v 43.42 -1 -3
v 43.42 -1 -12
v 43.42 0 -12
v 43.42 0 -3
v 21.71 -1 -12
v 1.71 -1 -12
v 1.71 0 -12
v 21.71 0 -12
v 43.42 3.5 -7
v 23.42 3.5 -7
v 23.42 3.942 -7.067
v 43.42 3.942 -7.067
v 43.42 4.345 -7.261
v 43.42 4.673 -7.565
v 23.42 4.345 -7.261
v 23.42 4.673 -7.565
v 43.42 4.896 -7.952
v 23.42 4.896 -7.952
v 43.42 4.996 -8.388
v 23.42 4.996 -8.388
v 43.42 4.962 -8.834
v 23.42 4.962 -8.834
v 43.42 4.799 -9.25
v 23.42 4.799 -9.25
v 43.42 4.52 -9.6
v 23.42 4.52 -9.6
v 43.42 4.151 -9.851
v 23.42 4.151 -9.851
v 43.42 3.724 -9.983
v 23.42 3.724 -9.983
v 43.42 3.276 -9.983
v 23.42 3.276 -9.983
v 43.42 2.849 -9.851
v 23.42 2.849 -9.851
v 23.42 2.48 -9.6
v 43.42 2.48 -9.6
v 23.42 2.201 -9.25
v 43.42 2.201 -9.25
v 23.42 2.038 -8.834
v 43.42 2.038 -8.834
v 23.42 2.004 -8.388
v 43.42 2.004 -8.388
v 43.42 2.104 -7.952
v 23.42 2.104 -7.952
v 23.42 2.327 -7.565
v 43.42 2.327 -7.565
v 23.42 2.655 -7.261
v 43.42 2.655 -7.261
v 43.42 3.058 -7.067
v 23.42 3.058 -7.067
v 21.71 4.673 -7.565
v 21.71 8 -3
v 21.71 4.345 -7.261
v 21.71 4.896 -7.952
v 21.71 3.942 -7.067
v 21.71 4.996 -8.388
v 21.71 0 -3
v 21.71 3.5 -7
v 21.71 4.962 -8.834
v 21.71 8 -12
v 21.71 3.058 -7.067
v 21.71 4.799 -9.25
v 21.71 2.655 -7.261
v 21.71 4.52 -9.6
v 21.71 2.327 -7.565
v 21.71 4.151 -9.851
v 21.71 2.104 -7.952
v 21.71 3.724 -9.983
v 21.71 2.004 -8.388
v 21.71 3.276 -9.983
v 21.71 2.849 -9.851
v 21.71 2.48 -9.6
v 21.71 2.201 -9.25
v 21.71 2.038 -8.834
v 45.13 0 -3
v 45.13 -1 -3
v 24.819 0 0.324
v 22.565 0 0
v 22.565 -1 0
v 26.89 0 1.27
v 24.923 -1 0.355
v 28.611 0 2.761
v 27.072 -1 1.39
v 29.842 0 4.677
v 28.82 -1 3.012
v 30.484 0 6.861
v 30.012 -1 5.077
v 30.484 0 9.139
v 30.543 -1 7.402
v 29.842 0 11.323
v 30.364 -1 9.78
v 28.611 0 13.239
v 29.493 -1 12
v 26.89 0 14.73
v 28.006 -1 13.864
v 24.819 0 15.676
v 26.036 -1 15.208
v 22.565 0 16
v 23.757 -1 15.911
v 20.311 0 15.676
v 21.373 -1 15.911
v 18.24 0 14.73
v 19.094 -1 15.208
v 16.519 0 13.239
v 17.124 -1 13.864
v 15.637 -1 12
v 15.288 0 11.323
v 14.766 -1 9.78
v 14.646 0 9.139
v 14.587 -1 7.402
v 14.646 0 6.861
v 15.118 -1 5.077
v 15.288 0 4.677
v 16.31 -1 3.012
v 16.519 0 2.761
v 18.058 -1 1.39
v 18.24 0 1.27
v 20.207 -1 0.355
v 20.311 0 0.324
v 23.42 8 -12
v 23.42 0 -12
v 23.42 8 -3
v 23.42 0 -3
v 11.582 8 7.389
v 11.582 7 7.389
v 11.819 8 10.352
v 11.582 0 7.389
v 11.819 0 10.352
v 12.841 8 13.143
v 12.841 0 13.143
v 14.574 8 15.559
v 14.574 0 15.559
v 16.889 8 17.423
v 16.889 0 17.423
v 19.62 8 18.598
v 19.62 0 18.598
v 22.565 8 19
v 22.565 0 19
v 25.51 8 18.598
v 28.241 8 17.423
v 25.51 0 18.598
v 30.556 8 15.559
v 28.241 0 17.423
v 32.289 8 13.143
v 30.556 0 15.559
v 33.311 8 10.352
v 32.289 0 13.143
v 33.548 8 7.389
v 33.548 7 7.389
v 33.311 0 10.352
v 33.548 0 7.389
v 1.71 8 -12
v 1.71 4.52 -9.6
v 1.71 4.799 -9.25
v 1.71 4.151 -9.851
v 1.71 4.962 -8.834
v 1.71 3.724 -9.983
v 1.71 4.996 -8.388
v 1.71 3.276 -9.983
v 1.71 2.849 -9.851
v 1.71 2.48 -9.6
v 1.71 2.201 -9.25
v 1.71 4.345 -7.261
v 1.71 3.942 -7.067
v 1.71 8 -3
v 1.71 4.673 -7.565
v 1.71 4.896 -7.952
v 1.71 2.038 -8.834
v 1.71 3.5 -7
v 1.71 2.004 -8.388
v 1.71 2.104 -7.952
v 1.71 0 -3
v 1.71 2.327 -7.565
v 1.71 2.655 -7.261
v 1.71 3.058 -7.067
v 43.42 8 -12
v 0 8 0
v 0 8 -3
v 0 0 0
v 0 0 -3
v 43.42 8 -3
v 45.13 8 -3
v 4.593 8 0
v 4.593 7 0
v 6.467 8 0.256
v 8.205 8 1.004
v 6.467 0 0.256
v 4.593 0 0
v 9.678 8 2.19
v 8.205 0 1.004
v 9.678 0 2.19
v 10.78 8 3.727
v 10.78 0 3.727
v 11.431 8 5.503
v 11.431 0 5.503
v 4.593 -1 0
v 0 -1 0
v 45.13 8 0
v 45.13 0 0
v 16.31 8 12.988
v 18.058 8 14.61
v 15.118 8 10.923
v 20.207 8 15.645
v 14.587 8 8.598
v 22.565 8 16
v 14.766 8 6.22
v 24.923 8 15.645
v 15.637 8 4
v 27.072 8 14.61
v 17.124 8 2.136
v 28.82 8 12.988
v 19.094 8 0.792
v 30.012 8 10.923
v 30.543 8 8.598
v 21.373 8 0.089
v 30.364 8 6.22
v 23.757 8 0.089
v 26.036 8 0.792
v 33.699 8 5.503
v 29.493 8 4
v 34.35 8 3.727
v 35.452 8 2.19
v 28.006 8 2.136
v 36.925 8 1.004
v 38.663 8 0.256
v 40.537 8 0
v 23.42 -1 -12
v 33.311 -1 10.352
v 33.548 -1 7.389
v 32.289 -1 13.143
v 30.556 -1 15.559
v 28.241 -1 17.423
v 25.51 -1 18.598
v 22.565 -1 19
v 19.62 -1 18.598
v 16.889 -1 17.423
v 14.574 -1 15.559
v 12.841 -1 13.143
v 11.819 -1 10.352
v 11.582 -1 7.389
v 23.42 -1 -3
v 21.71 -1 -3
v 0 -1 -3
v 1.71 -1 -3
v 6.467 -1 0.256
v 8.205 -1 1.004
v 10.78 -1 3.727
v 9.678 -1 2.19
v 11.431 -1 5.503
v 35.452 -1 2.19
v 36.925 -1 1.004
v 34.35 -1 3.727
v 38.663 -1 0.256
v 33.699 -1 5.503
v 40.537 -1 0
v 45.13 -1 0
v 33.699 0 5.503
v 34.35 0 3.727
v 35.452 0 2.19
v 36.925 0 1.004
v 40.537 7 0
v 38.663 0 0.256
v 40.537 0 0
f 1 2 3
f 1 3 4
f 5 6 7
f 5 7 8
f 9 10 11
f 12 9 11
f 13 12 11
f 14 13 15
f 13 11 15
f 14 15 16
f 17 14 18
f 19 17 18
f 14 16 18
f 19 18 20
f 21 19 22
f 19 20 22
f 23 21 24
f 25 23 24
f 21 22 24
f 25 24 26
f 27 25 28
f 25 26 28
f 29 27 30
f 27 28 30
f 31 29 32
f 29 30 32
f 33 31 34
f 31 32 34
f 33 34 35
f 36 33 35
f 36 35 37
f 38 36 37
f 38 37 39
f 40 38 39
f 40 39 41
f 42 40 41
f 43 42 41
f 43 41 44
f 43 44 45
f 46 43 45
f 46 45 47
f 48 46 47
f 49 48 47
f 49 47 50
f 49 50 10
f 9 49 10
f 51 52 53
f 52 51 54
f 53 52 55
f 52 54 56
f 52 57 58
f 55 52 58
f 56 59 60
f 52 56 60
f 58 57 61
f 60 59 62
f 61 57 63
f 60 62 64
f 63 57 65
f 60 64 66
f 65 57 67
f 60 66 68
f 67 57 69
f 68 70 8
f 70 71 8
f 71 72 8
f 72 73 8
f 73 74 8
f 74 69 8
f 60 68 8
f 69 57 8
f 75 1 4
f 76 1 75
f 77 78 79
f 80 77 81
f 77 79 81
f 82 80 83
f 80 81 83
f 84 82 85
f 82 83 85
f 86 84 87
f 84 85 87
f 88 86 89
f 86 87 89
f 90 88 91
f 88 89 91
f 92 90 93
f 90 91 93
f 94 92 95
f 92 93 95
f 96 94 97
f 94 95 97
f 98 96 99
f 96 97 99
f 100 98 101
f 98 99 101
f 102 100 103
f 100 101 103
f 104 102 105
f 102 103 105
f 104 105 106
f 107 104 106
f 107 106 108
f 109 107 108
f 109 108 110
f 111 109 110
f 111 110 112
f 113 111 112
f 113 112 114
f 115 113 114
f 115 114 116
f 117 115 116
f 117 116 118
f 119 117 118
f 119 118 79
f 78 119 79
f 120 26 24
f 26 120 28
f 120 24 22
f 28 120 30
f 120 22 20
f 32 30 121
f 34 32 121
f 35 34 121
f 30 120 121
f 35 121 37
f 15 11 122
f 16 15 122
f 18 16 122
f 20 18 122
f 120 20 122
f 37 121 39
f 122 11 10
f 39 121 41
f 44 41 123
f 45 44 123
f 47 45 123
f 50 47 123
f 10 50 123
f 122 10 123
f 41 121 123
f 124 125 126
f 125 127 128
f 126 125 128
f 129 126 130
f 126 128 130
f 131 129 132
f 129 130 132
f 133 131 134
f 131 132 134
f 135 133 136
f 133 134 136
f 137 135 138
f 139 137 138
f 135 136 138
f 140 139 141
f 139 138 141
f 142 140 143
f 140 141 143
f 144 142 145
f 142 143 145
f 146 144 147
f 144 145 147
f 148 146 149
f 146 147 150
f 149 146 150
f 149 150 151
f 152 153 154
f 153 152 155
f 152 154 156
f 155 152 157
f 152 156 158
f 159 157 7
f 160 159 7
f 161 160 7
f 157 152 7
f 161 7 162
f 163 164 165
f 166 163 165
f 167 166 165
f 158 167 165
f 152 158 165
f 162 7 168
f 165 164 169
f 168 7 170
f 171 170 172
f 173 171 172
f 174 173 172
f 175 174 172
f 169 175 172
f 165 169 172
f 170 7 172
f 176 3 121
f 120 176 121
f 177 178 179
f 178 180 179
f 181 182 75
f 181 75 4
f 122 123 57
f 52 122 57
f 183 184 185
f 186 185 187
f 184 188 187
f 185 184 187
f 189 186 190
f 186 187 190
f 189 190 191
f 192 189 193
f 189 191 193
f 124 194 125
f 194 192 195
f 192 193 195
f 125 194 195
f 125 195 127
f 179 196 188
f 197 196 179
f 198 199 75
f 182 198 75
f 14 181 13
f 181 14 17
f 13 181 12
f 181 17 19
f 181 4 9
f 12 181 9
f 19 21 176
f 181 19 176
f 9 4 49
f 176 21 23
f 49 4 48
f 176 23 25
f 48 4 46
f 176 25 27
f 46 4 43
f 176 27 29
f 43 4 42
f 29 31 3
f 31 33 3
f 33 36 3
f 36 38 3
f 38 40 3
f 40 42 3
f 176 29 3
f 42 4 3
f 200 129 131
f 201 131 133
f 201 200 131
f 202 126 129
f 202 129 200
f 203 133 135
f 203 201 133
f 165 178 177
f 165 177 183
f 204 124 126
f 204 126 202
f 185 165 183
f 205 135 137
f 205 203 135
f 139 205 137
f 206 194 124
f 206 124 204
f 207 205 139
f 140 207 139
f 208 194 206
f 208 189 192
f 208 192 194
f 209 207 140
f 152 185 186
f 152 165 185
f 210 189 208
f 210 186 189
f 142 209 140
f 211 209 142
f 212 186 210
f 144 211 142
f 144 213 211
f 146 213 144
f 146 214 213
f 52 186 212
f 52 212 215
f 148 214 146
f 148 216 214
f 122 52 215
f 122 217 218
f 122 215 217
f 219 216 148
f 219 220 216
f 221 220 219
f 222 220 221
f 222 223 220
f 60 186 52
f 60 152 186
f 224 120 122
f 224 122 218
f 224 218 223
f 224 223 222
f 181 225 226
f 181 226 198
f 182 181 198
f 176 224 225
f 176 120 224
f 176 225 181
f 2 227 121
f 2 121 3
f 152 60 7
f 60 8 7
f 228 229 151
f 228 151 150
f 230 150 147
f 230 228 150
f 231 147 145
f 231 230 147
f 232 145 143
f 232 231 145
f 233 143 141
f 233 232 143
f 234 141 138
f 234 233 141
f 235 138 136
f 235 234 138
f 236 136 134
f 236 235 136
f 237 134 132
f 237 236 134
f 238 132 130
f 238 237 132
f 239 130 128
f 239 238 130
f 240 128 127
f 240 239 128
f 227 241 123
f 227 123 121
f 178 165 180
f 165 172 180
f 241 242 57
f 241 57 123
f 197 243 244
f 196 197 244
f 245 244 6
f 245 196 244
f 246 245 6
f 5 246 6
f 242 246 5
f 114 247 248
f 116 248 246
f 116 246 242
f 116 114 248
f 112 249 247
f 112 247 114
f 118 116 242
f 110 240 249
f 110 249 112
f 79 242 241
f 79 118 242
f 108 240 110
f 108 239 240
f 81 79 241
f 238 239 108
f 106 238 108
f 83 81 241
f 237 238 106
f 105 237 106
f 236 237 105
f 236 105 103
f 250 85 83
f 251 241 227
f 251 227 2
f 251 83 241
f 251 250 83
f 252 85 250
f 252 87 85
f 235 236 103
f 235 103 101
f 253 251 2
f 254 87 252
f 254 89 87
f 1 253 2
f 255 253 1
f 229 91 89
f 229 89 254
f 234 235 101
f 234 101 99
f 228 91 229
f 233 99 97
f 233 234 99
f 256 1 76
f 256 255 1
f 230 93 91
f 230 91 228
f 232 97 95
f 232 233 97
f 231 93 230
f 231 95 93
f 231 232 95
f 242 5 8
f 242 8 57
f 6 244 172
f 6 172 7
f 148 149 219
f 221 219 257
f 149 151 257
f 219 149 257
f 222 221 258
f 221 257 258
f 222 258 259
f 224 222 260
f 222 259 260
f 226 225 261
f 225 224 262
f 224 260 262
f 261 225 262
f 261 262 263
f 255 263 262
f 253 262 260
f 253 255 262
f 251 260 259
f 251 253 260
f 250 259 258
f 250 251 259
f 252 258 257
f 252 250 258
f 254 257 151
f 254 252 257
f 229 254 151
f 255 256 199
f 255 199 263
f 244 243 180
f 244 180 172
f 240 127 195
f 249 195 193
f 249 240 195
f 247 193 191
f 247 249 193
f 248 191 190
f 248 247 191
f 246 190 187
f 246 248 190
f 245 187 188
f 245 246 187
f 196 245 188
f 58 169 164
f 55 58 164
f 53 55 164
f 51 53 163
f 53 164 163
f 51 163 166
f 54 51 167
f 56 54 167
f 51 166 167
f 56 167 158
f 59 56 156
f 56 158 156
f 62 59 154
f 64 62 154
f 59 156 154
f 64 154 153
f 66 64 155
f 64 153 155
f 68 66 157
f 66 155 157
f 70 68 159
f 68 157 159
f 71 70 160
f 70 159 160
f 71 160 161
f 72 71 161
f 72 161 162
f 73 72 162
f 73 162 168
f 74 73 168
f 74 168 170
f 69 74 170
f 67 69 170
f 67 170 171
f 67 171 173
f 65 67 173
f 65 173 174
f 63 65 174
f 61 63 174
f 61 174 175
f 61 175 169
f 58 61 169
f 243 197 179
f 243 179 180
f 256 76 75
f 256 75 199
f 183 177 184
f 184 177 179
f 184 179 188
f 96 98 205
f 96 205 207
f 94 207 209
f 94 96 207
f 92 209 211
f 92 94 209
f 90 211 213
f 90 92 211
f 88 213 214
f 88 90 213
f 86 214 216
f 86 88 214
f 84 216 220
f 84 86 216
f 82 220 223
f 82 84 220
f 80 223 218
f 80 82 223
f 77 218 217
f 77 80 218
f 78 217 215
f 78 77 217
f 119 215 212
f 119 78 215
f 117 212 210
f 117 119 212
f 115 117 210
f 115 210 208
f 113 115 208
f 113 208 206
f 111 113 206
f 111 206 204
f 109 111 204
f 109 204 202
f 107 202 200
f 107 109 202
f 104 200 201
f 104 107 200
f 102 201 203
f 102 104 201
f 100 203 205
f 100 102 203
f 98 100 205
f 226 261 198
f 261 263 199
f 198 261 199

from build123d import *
from build123d.topology import SkipClean

# Parameters (mm, degrees)
SKETCH1_R           = 11
SKETCH1_R_2         = 8
SKETCH1_W           = 45.13
SKETCH1_H           = 7
BOSS_EXTRUDE1_DEPTH = 10
FILLET1_R           = 7
SKETCH2_W           = 1.71
SKETCH2_H           = 4
CUT_EXTRUDE1_DEPTH  = 10
SKETCH3_W           = 20
SKETCH3_H           = 10
BOSS_EXTRUDE2_DEPTH = 3
CUT_EXTRUDE2_START  = -3
CUT_EXTRUDE2_DEPTH  = 3
SKETCH6_W           = 20
SKETCH6_H           = 7
BOSS_EXTRUDE3_DEPTH = 2
SKETCH7_R           = 1.5
CUT_EXTRUDE5_DEPTH  = 44
SKETCH8_R           = 8
BOSS_EXTRUDE4_DEPTH = 1
BOSS_EXTRUDE5_START = 1
SKETCH9_R           = 8
BOSS_EXTRUDE5_DEPTH = 1


with BuildPart() as part:
    # Sketch1 → Boss-Extrude1 (new body)
    # profile 1 of 2: a face of its own
    with BuildSketch(Plane(origin=(0, 0, 0), x_dir=(1, 0, 0), z_dir=(0, 1, 0))):
        with Locations((22.565, -8)):
            Circle(SKETCH1_R)
        with Locations(Location((22.565, -8, 0), (0, 0, 270))):
            Circle(SKETCH1_R_2, mode=Mode.SUBTRACT)
    # profile 2 of 2: a face of its own
    with BuildSketch(Plane(origin=(0, 0, 0), x_dir=(1, 0, 0), z_dir=(0, 1, 0))):
        with Locations((22.565, 3.5)):
            Rectangle(SKETCH1_W, SKETCH1_H)
    extrude(amount=BOSS_EXTRUDE1_DEPTH)

    # Fillet1
    fillet1_edges = [part.edges().sort_by_distance(p)[0] for p in [
        (30.114834435, 5, 0),
        (15.015165565, 5, 0),
    ]]
    fillet(fillet1_edges, radius=FILLET1_R)

    # Sketch2 → Cut-Extrude1 (cut)
    with BuildSketch(Plane(origin=(0, 10, 0), x_dir=(1, 0, 0), z_dir=(0, 1, 0))):
        with Locations((0.855, 5)):
            Rectangle(SKETCH2_W, SKETCH2_H)
        with Locations((22.565, 5)):
            Rectangle(SKETCH2_W, SKETCH2_H)
        with Locations((44.275, 5)):
            Rectangle(SKETCH2_W, SKETCH2_H)
    extrude(amount=-CUT_EXTRUDE1_DEPTH, mode=Mode.SUBTRACT)

    # Sketch3 → Boss-Extrude2 (add)
    with BuildSketch(Plane(origin=(0, 0, -7), x_dir=(-1, 0, 0), z_dir=(0, 0, -1))):
        with Locations((-33.42, 5)):
            Rectangle(SKETCH3_W, SKETCH3_H)
        with Locations((-11.71, 5)):
            Rectangle(SKETCH3_W, SKETCH3_H)
    extrude(amount=BOSS_EXTRUDE2_DEPTH)

    # Sketch4 → Cut-Extrude2 (cut)
    with BuildSketch(Plane(origin=(0, 10, 0), x_dir=(1, 0, 0), z_dir=(0, 1, 0)).offset(CUT_EXTRUDE2_START)):
        with BuildLine():
            Line((21.71, 3), (21.71, 10))
            Line((21.71, 10), (1.71, 10))
            Line((1.71, 10), (1.71, 3))
            Line((1.71, 3), (0, 3))
            Line((0, 3), (0, 0))
            Line((0, 0), (4.592799244, 0))
            ThreePointArc((4.592799244, 0), (9.678181345, -2.189710103), (11.581988427, -7.388888889))
            ThreePointArc((11.581988427, -7.388888889), (22.565, -19), (33.548011573, -7.388888889))
            ThreePointArc((33.548011573, -7.388888889), (35.451818655, -2.189710103), (40.537200756, 0))
            Line((40.537200756, 0), (45.13, 0))
            Line((45.13, 0), (45.13, 3))
            Line((45.13, 3), (43.42, 3))
            Line((43.42, 3), (43.42, 10))
            Line((43.42, 10), (23.42, 10))
            Line((23.42, 10), (23.42, 3))
            Line((23.42, 3), (21.71, 3))
        make_face()
    extrude(amount=CUT_EXTRUDE2_DEPTH, mode=Mode.SUBTRACT)

    # Sketch6 → Boss-Extrude3 (add)
    with BuildSketch(Plane(origin=(0, 0, -10), x_dir=(-1, 0, 0), z_dir=(0, 0, -1))):
        with Locations((-33.42, 3.5)):
            Rectangle(SKETCH6_W, SKETCH6_H)
        with Locations((-11.71, 3.5)):
            Rectangle(SKETCH6_W, SKETCH6_H)
    extrude(amount=BOSS_EXTRUDE3_DEPTH)

    # Sketch7 → Cut-Extrude5 (cut)
    with BuildSketch(Plane.ZY.offset(-1.71)):
        with Locations((-8.5, 3.5)):
            Circle(SKETCH7_R)
    extrude(amount=-CUT_EXTRUDE5_DEPTH, mode=Mode.SUBTRACT)

    # Sketch8 → Boss-Extrude4 (add)
    with BuildSketch(Plane(origin=(0, 7, 0), x_dir=(1, 0, 0), z_dir=(0, 1, 0))):
        with BuildLine():
            Line((23.42, 3), (21.71, 3))
            Line((21.71, 3), (21.71, 12))
            Line((21.71, 12), (1.71, 12))
            Line((1.71, 12), (1.71, 3))
            Line((1.71, 3), (0, 3))
            Line((0, 3), (0, 0))
            Line((0, 0), (4.592799244, 0))
            ThreePointArc((4.592799244, 0), (9.678181345, -2.189710103), (11.581988427, -7.388888889))
            ThreePointArc((11.581988427, -7.388888889), (22.565, -19), (33.548011573, -7.388888889))
            ThreePointArc((33.548011573, -7.388888889), (35.451818655, -2.189710103), (40.537200756, 0))
            Line((40.537200756, 0), (45.13, 0))
            Line((45.13, 0), (45.13, 3))
            Line((45.13, 3), (43.42, 3))
            Line((43.42, 3), (43.42, 12))
            Line((43.42, 12), (23.42, 12))
            Line((23.42, 12), (23.42, 3))
        make_face()
        with Locations(Location((22.565, -8, 0), (0, 0, 270))):
            Circle(SKETCH8_R, mode=Mode.SUBTRACT)
    extrude(amount=BOSS_EXTRUDE4_DEPTH)

    # Sketch9 → Boss-Extrude5 (add)
    with SkipClean():  # the faces are left unmerged after this step: merging them gives an invalid solid
        with BuildSketch(Plane.XZ.offset(BOSS_EXTRUDE5_START)):
            with BuildLine():
                Line((1.71, -3), (1.71, -12))
                Line((1.71, -12), (21.71, -12))
                Line((21.71, -12), (21.71, -3))
                Line((21.71, -3), (23.42, -3))
                Line((23.42, -3), (23.42, -12))
                Line((23.42, -12), (43.42, -12))
                Line((43.42, -12), (43.42, -3))
                Line((43.42, -3), (45.13, -3))
                Line((45.13, -3), (45.13, 0))
                Line((45.13, 0), (40.537200756, 0))
                ThreePointArc((40.537200756, 0), (35.451818655, 2.189710103), (33.548011573, 7.388888889))
                ThreePointArc((33.548011573, 7.388888889), (22.565, 19), (11.581988427, 7.388888889))
                ThreePointArc((11.581988427, 7.388888889), (9.678181345, 2.189710103), (4.592799244, 0))
                Line((4.592799244, 0), (0, 0))
                Line((0, 0), (0, -3))
                Line((0, -3), (1.71, -3))
            make_face()
            with Locations(Location((22.565, 8, 0), (0, 0, 270))):
                Circle(SKETCH9_R, mode=Mode.SUBTRACT)
        extrude(amount=-BOSS_EXTRUDE5_DEPTH)


solid = part.part
